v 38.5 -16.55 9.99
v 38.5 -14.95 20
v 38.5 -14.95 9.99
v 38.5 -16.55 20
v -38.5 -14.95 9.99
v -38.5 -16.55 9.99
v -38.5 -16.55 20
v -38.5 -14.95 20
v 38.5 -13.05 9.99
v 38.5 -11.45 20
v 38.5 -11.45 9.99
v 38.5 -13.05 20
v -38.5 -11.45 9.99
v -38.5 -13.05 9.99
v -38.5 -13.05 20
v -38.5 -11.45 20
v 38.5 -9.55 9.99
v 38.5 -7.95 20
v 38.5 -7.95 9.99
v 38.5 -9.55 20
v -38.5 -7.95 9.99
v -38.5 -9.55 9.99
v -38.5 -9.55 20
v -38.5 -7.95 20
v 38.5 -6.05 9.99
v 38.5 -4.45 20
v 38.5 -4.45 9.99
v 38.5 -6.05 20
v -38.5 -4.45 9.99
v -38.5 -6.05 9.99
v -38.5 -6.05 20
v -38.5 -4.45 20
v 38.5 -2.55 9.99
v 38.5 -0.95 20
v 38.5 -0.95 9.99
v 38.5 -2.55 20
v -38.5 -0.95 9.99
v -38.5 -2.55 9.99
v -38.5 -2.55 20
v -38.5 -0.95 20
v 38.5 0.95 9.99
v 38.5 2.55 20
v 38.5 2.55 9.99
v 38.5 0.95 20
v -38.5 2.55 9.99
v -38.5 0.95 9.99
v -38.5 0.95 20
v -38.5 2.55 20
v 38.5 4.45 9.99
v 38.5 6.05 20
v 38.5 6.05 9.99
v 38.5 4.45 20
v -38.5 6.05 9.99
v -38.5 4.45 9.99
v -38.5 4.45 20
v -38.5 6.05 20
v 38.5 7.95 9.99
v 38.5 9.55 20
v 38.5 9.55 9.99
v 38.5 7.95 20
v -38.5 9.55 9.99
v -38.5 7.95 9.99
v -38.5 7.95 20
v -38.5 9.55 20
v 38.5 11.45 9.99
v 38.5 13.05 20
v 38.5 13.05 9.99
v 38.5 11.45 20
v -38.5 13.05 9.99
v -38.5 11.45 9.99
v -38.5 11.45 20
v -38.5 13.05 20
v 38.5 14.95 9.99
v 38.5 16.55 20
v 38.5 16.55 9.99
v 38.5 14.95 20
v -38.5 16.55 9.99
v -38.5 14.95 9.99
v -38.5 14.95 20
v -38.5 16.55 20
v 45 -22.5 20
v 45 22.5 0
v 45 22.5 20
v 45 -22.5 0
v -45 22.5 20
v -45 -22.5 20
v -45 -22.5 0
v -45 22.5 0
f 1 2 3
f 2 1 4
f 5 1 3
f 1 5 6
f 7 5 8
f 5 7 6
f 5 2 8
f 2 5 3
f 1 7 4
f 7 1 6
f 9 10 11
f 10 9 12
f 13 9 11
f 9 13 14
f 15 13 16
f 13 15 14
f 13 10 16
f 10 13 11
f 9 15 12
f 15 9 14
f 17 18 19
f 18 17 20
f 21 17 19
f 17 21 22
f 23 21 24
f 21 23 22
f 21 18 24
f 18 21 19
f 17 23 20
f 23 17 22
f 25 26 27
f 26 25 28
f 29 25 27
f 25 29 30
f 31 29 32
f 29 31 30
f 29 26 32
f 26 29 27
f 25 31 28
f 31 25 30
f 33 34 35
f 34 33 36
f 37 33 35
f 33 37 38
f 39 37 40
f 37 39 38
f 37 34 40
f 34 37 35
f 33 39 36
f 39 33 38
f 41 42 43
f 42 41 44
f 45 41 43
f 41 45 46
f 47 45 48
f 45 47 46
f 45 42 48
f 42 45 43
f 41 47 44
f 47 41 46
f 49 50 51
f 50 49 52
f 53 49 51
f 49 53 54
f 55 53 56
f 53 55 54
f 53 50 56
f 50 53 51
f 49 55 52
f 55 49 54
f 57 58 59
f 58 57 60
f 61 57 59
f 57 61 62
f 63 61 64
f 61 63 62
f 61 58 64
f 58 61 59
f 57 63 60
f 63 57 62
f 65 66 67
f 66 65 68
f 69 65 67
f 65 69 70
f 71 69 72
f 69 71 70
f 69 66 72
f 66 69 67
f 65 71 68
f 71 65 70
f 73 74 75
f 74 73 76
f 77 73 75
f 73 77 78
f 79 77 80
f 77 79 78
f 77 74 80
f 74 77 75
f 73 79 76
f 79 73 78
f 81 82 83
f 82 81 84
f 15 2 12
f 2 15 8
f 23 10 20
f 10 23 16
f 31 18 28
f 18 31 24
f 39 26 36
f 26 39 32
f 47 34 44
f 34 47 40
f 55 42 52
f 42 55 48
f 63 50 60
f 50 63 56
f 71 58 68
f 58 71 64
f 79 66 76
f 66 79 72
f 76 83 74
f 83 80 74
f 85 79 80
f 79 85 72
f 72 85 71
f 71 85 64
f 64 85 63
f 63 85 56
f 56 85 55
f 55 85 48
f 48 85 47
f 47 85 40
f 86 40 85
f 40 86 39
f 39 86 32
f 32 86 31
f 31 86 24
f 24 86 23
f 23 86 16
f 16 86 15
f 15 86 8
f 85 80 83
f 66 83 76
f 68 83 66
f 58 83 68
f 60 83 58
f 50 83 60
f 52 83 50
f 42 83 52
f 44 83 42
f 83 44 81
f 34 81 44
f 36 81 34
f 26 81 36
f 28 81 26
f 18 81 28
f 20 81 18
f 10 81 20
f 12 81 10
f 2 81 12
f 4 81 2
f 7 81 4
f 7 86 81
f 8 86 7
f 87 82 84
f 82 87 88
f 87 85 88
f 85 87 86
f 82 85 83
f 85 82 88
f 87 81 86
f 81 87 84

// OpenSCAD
// Drying rack for 10 microscope slides (75 x 25 x 1 mm)
// Slides stand upright on their long edge, held in parallel slots.

// --- Base block dimensions ---
base_L = 90;   // length along X (mm)
base_W = 45;   // width along Y (mm)
base_H = 20;   // height along Z (mm)

// --- Slot dimensions ---
slot_L = 77;   // slot length along X (mm)
slot_W = 1.6;  // slot width along Y (mm)
slot_D = 10;   // slot depth from top face (mm)

// --- Slot layout ---
n_slots = 10;          // number of slots
slot_pitch = 3.5;      // centre-to-centre spacing along Y (mm)

// --- Derived values ---
// Total span of slot centres (first to last)
slot_span = (n_slots - 1) * slot_pitch;   // 9 * 3.5 = 31.5 mm

// Y position of the first (lowest) slot centre, so the group is centred on Y=0
y_first = -slot_span / 2;

// Z position of the slot bottom (top face is at z = base_H)
slot_z_bottom = base_H - slot_D;          // 20 - 10 = 10 mm

// Extend cutters 0.5 mm past the top face to avoid coplanar faces
cut_extend = 0.5;

$fn = 64;

// --- Build the rack ---
difference() {
    // Solid base block, centred on origin in X and Y, resting on z=0
    translate([-base_L/2, -base_W/2, 0])
        cube([base_L, base_W, base_H]);

    // 10 parallel slots, each running along X, open at top
    for (i = [0 : n_slots-1]) {
        y_c = y_first + i * slot_pitch;
        // Cutter box: extends 0.5 mm above the top face (z = base_H + 0.5)
        // and 0.5 mm below the slot bottom to ensure clean cut
        translate([
            -slot_L/2,
            y_c - slot_W/2,
            slot_z_bottom - 0.01   // start just below slot bottom; top extends past base_H
        ])
        cube([
            slot_L,
            slot_W,
            slot_D + 0.5 + 0.01    // height: from (slot_z_bottom - 0.01) to (base_H + 0.5)
        ]);
    }
}
